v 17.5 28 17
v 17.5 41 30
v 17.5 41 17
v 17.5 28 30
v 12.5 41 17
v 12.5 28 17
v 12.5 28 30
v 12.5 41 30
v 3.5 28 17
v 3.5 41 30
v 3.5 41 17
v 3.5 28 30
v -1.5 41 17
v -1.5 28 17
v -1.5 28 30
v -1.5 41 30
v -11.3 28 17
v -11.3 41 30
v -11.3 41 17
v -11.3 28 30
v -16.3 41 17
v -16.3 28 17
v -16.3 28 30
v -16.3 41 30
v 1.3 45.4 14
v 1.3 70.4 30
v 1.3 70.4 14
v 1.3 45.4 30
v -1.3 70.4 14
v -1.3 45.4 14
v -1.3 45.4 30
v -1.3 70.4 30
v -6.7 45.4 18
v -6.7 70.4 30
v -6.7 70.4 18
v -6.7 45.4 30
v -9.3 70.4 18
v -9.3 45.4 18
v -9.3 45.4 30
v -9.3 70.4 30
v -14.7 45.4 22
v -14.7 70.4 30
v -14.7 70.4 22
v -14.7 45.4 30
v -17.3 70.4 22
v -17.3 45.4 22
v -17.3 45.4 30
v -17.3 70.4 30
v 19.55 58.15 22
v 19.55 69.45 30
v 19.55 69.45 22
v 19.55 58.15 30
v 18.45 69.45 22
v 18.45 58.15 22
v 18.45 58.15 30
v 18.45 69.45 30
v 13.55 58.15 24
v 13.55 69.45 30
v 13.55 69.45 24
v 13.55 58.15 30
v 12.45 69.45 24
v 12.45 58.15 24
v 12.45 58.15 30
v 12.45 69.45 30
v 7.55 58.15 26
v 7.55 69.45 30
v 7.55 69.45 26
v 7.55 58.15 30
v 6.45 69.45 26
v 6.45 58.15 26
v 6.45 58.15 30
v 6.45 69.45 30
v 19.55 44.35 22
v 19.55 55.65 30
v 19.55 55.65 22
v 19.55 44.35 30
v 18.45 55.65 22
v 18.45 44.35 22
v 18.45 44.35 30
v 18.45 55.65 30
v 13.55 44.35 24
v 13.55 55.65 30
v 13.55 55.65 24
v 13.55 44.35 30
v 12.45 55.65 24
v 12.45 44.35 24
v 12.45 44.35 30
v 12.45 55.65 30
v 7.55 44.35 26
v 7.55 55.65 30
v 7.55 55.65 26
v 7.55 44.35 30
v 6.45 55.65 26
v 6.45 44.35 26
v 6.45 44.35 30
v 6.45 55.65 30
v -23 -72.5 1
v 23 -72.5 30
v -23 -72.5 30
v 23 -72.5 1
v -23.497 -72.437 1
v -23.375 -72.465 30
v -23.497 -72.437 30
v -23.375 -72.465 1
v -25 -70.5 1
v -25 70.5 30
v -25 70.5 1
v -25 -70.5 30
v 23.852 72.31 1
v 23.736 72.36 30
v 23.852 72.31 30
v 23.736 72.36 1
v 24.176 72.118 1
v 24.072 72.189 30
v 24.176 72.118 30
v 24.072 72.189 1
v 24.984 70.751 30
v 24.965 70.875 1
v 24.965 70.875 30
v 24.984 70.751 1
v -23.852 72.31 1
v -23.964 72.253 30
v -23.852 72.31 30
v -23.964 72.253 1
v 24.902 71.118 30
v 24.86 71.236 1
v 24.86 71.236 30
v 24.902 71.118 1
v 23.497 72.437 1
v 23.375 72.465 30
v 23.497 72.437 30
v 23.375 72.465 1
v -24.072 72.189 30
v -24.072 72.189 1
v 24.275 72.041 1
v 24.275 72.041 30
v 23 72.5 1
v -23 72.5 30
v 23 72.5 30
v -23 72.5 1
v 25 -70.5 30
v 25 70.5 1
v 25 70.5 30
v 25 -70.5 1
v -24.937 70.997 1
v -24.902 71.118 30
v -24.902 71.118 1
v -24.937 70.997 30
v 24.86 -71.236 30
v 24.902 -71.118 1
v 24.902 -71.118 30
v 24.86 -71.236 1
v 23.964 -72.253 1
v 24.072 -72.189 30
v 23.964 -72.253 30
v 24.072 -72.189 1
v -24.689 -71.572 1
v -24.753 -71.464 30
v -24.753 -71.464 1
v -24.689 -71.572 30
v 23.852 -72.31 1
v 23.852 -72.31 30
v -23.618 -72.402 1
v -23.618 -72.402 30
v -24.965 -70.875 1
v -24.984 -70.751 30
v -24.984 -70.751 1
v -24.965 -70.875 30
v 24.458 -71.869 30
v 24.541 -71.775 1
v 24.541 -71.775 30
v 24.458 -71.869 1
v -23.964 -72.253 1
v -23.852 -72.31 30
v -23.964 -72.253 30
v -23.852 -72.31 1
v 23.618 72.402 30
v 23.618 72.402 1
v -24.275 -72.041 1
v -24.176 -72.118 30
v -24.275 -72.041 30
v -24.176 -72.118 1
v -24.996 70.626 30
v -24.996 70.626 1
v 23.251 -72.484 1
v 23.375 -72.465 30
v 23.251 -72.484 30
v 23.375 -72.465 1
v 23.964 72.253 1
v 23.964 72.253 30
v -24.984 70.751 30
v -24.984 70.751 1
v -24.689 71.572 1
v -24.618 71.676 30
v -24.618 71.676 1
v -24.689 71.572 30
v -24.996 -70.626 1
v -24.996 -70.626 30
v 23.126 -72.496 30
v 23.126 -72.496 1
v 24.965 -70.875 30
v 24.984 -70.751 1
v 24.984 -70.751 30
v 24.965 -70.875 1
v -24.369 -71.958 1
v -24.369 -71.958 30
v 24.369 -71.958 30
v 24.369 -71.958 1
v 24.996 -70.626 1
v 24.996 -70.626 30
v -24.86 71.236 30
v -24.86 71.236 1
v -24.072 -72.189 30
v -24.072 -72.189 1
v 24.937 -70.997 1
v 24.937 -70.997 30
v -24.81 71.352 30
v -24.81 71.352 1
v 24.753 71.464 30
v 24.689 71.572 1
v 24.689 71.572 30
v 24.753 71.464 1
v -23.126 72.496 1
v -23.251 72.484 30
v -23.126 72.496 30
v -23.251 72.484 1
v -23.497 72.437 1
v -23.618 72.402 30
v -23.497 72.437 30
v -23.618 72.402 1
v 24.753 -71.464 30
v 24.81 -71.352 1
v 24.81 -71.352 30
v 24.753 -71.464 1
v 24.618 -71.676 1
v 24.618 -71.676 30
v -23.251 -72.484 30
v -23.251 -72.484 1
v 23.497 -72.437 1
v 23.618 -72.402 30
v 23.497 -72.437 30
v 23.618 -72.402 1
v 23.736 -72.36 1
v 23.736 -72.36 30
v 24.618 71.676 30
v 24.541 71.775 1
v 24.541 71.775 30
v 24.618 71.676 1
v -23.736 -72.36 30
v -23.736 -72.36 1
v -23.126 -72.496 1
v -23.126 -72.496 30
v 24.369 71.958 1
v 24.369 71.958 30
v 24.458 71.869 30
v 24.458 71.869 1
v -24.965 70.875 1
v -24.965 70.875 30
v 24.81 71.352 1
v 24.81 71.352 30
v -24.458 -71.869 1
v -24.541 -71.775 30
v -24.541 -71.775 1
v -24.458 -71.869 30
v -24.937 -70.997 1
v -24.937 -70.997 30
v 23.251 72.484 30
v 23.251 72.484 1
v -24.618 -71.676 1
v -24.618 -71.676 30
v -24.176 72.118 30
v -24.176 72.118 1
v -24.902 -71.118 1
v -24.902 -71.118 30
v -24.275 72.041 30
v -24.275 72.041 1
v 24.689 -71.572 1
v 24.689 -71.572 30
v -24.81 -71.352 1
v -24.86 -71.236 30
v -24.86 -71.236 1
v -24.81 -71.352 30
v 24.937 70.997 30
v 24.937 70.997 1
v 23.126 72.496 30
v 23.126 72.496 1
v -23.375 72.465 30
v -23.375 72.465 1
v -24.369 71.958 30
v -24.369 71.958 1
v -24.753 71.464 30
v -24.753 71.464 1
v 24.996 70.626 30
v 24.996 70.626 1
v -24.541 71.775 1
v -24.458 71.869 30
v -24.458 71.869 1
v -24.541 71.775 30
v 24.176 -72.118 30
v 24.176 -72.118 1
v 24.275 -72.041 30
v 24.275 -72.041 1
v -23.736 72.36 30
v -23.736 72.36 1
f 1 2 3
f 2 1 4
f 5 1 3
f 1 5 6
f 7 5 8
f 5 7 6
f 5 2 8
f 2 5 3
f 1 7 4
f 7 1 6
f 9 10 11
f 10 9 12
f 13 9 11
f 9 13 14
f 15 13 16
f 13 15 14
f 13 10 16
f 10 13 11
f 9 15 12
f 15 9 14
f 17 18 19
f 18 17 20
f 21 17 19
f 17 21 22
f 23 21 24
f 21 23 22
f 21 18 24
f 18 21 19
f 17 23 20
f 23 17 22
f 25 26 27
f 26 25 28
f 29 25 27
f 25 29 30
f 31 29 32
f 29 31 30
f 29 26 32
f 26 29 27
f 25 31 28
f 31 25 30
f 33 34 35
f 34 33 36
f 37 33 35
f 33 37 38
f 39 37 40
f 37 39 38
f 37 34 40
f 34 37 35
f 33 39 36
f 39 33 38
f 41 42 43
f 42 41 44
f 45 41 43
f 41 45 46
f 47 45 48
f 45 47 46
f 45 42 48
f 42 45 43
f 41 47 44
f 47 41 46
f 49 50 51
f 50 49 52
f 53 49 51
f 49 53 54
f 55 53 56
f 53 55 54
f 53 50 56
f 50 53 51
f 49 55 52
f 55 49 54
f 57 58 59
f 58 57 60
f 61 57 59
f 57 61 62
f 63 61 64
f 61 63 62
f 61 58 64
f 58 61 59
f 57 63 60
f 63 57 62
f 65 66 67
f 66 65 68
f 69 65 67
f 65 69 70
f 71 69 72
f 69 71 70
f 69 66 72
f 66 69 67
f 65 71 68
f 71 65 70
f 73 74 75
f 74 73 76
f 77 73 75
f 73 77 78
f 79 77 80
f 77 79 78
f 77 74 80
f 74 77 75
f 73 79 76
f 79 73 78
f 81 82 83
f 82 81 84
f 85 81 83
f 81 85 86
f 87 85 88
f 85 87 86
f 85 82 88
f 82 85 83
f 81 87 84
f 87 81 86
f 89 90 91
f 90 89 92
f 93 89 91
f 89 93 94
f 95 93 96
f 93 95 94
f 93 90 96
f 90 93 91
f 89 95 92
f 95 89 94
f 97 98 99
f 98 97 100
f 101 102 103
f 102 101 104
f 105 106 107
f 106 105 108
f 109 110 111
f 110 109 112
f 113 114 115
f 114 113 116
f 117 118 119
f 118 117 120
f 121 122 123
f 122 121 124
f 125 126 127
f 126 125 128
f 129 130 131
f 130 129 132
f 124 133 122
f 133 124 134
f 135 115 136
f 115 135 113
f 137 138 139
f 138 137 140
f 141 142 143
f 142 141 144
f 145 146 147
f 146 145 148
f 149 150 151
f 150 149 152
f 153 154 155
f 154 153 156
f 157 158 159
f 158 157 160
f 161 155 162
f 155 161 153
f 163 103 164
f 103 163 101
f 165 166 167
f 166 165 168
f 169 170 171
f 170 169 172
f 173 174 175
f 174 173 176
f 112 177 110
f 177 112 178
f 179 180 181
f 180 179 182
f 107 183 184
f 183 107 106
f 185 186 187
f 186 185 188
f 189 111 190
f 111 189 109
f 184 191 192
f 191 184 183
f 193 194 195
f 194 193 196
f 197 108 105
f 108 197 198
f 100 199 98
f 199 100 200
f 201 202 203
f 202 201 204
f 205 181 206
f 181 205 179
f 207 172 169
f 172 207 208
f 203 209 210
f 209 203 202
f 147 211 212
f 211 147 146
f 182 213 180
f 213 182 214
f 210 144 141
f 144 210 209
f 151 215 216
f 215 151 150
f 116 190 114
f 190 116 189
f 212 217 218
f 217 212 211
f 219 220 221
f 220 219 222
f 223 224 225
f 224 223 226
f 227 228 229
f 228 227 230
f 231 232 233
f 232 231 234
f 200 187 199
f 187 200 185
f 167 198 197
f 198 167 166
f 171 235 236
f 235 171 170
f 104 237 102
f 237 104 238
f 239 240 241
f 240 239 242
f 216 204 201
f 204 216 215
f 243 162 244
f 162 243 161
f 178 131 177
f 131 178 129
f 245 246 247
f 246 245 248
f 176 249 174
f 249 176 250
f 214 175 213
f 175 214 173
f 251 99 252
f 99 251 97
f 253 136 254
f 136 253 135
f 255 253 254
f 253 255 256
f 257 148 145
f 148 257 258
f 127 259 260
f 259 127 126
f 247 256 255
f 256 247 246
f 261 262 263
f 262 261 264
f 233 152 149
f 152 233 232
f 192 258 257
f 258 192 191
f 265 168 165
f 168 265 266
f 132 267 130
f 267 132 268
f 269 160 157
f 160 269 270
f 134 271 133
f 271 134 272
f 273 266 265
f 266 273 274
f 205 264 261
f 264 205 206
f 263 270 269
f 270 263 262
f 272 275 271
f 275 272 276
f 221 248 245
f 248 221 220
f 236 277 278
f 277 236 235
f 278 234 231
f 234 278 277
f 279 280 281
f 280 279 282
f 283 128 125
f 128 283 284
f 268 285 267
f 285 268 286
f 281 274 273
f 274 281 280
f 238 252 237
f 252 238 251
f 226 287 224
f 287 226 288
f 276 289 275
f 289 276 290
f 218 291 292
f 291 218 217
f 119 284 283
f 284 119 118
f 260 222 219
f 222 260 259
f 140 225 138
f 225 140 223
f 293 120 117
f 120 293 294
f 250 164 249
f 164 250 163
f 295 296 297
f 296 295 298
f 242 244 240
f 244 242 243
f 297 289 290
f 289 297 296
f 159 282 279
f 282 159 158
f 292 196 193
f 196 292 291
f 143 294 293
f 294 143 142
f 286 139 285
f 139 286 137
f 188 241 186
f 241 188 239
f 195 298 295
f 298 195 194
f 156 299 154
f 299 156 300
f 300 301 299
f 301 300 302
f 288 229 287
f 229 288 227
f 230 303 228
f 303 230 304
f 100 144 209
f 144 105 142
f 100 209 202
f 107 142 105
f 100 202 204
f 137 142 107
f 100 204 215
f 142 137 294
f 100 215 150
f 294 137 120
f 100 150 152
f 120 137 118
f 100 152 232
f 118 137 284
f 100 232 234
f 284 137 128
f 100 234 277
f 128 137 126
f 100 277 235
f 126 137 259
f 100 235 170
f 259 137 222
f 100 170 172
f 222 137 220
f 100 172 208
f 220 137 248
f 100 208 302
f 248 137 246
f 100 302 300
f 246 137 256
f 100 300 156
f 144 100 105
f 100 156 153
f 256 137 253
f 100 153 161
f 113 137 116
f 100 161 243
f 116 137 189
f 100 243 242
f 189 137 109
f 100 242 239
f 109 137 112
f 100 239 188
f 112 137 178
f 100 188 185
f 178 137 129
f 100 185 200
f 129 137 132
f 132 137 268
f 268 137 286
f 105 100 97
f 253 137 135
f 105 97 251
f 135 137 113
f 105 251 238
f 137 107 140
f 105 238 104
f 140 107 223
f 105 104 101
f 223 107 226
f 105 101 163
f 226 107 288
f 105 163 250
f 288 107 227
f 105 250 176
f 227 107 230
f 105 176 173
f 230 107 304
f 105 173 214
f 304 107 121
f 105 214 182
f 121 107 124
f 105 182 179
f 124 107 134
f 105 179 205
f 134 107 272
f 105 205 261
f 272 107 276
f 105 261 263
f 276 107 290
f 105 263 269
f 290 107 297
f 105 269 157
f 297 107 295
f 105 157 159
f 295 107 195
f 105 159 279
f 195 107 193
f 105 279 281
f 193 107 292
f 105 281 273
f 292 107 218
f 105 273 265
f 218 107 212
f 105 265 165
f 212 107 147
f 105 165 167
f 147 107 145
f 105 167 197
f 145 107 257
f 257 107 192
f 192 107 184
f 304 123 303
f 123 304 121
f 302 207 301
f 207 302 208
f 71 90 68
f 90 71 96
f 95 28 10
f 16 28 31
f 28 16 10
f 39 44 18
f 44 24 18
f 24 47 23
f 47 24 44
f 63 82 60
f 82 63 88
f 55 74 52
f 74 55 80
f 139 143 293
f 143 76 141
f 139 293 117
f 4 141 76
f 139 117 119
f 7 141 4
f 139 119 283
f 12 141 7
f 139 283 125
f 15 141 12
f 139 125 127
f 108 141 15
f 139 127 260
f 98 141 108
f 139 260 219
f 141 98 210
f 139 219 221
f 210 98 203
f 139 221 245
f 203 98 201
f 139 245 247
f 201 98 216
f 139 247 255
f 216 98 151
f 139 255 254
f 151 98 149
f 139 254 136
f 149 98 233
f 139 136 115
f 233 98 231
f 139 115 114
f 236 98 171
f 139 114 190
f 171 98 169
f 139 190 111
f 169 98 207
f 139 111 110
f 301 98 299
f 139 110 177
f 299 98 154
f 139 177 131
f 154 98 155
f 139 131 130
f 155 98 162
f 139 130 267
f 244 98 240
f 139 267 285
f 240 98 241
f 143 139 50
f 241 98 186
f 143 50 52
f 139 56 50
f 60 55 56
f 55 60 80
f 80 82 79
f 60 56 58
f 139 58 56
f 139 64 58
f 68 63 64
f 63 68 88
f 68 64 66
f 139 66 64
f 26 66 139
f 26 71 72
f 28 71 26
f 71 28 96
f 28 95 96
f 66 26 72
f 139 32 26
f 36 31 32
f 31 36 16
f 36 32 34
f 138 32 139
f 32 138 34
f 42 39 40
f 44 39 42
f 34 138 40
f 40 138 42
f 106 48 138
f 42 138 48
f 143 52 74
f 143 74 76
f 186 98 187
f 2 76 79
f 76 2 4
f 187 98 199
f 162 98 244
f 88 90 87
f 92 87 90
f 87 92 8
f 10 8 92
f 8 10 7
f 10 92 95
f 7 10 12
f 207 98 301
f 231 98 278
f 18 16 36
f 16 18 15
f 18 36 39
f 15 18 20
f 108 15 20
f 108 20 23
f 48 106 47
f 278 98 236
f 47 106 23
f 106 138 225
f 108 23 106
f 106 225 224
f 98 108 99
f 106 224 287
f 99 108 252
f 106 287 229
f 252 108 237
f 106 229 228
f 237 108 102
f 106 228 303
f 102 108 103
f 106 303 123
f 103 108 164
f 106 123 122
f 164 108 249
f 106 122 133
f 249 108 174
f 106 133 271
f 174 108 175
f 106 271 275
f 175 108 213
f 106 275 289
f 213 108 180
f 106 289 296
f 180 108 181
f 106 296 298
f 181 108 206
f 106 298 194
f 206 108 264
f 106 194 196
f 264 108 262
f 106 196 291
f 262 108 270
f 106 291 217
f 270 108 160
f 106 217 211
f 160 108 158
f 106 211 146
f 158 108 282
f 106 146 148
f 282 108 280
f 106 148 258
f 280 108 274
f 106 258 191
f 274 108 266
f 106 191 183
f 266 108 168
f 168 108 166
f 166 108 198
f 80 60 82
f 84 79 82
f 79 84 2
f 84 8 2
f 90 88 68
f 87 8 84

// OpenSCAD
/**
* Customisable Tea Organiser
* Version 1.0 
*
* See "Customisable parameters" section below to custom the organiser to your needs
*
* Author: Joseph Lee
*         https://github.com/joelee
*         https://www.linkedin.com/in/joeworks
*/


/**
* Customisable parameters
*/

// Main block size
block_width = 50;
block_depth = 145;
block_height = 30;


// Custom slots
// Available shapes:
//     "rect"  - Rectangle
//     "cyl"   - Cylinder, if width provided, a hull (oval like) shape
//     "redge" - Round Edge Rectangle, support 2 widths (width & width2)
// Location is relative to the centre of the main block
// If drain is set to true, it will render a drainage hole on the slot
slots = [
//                location
//  [Shape,   [    x,   y,  z], depth, width, width2, drain]
//    ["rect",  [   -11,  -46, 0],    18, 47.9,  0,  false], // Kanto Speakers
//    ["rect",  [   6,  -47.9, 12],    8, 42,  0,  false],    // Fan 
//    ["rect",  [   17,  -47.9, 0],    8, 42,  0,  false],   // RGB LED
//    ["redge", [ 0,  2,  0], 32.6, 42.6, 34.9, false],      // LG C1 TV

    ["rect",  [   15,  34.5, 15],   5, 13, 0,  false],    // USB Stick
    ["rect",  [      1,  34.5, 15], 5, 13, 0,  false],  // USB Stick
    ["rect",  [  -13.8,  34.5, 15], 5, 13, 0,  false],  // USB Stick
    
    ["rect",  [    0,  57.9, 12],    2.6, 25,  0,  false],  // SD Card 1
    ["rect",  [   -8,  57.9, 16],    2.6, 25,  0,  false],  // SD Card 2
    ["rect",  [  -16,  57.9, 20],    2.6, 25,  0,  false],  // SD Card 3
    
    ["rect",  [   19,  63.8, 20],    1.1, 11.3,  0,  false],  // MicroSD Card 1
    ["rect",  [   13,  63.8, 22],    1.1, 11.3,  0,  false],  // MicroSD Card 2
    ["rect",  [    7,  63.8, 24],    1.1, 11.3,  0,  false],  // MicroSD Card 3
    ["rect",  [   19,  50,   20],    1.1, 11.3,  0,  false],  // MicroSD Card 4
    ["rect",  [   13,  50,   22],    1.1, 11.3,  0,  false],  // MicroSD Card 5
    ["rect",  [    7,  50,   24],     1.1, 11.3,  0,  false],  // MicroSD Card 6
];


/**
* End of Customisable parameters
*
* You shouldn't need to modify anything pass here...
*/



$fn = 100;

// Render Drainage hole
module drain_block(diag) {
    diag2 = diag*2;
    z = block_height + 20;
    translate([0, 0, 1])
        difference() {
            translate([0, 0, diag])
                sphere(d=diag2);
            translate([-diag, -diag, 2]) {
                cube([diag2+2, diag2+2, z]);
            }
        }
    translate([0, 0, -53])
        cylinder(h=z, d=2);
}


// Cylinder block
module cyl_block(diag, drain=false) {
    translate([0, 0, 2])
        cylinder(h=50, d=diag);
    if (drain) drain_block(diag);
}


// Hull block - Oval like shape
module hull_block(w, d, drain=false) {
    diag = min(w, d);
    width = max(max(w, d) - diag, 0);
    rotate = w<d ? 0 : 90;
    translate([-width/2, 0, 2]) rotate([0, 0, rotate])
        hull() {
            translate([width,0,0]) cylinder(h=50, d=diag);
            cylinder(h=50, d=diag);
        }
    if (drain) drain_block(diag);
}


// Rectangle block
module rect_block(w, d, drain=false) {
    translate([0, 0, 27])
        cube([w, d, 50], center=true);
    if (drain) drain_block(min(w, d));
}


// Round edge block - support 2 different widths (round-edge rectangle)
module round_edge_block(d, w1=0, w2=0, h=50, mr=2, drain=false) {
    w1 = w1==0 ? d : w1;
    w2 = w2==0 ? w1 : w2;
    of = drain ? (h/2)+2 : h/2;
    
    if (w1 == w2) {
        translate([0, 0, of])
            if (mr>0) {
                minkowski() {
                   cube([w1-(mr*2), d-(mr*2), h-2], center=true);
                   cylinder(r=mr,h=1);
                }
            } else {
                cube([w, d, h], center=true);
            }
    } else {
        translate([-d/2, 0, 27])
            minkowski() {
                hull() {
                    translate([d,0,0]) cube([1, w1, h], center=true);
                    cube([1, w2, h], center=true);
                }
                cylinder(r=mr,h=h);
            }
    }
    if (drain) drain_block(min(w1, w2, d));
}


// Render the main block
module main_block(w, d, h) {
    round_edge_block(d=d, w1=w, h=h, mr=2, drain=false);
}


module render_slot(shape, d, w1, w2, drain=false) {
    if (shape == "rect") {
        rect_block(d, w1, drain=drain);
    } else if (shape == "cyl") {
        if (w1 > 0) {
            hull_block(d, w1, drain=drain);
        } else {
            cyl_block(d, drain=drain);
        }
    } else if (shape == "redge") {  // Round edge
        round_edge_block(d=d, w1=w1, w2=w2, drain=drain);
    }
}


module main() {
    difference() {
        // Render the main block
        main_block(block_width, block_depth, block_height);
        
        // Render Text
        translate([-10, -79.9, 5.4]) rotate([90,0,0])
            linear_extrude(3)
                text("Tea", size=12, font="Marker Felt:style=bold", spacing = 1.02);
        
        // Render the slots
        for (s = slots) {
            translate(s[1]) render_slot(shape=s[0], d=s[2], w1=s[3], w2=s[4], drain=s[5]);
        }
    }
}

main();
